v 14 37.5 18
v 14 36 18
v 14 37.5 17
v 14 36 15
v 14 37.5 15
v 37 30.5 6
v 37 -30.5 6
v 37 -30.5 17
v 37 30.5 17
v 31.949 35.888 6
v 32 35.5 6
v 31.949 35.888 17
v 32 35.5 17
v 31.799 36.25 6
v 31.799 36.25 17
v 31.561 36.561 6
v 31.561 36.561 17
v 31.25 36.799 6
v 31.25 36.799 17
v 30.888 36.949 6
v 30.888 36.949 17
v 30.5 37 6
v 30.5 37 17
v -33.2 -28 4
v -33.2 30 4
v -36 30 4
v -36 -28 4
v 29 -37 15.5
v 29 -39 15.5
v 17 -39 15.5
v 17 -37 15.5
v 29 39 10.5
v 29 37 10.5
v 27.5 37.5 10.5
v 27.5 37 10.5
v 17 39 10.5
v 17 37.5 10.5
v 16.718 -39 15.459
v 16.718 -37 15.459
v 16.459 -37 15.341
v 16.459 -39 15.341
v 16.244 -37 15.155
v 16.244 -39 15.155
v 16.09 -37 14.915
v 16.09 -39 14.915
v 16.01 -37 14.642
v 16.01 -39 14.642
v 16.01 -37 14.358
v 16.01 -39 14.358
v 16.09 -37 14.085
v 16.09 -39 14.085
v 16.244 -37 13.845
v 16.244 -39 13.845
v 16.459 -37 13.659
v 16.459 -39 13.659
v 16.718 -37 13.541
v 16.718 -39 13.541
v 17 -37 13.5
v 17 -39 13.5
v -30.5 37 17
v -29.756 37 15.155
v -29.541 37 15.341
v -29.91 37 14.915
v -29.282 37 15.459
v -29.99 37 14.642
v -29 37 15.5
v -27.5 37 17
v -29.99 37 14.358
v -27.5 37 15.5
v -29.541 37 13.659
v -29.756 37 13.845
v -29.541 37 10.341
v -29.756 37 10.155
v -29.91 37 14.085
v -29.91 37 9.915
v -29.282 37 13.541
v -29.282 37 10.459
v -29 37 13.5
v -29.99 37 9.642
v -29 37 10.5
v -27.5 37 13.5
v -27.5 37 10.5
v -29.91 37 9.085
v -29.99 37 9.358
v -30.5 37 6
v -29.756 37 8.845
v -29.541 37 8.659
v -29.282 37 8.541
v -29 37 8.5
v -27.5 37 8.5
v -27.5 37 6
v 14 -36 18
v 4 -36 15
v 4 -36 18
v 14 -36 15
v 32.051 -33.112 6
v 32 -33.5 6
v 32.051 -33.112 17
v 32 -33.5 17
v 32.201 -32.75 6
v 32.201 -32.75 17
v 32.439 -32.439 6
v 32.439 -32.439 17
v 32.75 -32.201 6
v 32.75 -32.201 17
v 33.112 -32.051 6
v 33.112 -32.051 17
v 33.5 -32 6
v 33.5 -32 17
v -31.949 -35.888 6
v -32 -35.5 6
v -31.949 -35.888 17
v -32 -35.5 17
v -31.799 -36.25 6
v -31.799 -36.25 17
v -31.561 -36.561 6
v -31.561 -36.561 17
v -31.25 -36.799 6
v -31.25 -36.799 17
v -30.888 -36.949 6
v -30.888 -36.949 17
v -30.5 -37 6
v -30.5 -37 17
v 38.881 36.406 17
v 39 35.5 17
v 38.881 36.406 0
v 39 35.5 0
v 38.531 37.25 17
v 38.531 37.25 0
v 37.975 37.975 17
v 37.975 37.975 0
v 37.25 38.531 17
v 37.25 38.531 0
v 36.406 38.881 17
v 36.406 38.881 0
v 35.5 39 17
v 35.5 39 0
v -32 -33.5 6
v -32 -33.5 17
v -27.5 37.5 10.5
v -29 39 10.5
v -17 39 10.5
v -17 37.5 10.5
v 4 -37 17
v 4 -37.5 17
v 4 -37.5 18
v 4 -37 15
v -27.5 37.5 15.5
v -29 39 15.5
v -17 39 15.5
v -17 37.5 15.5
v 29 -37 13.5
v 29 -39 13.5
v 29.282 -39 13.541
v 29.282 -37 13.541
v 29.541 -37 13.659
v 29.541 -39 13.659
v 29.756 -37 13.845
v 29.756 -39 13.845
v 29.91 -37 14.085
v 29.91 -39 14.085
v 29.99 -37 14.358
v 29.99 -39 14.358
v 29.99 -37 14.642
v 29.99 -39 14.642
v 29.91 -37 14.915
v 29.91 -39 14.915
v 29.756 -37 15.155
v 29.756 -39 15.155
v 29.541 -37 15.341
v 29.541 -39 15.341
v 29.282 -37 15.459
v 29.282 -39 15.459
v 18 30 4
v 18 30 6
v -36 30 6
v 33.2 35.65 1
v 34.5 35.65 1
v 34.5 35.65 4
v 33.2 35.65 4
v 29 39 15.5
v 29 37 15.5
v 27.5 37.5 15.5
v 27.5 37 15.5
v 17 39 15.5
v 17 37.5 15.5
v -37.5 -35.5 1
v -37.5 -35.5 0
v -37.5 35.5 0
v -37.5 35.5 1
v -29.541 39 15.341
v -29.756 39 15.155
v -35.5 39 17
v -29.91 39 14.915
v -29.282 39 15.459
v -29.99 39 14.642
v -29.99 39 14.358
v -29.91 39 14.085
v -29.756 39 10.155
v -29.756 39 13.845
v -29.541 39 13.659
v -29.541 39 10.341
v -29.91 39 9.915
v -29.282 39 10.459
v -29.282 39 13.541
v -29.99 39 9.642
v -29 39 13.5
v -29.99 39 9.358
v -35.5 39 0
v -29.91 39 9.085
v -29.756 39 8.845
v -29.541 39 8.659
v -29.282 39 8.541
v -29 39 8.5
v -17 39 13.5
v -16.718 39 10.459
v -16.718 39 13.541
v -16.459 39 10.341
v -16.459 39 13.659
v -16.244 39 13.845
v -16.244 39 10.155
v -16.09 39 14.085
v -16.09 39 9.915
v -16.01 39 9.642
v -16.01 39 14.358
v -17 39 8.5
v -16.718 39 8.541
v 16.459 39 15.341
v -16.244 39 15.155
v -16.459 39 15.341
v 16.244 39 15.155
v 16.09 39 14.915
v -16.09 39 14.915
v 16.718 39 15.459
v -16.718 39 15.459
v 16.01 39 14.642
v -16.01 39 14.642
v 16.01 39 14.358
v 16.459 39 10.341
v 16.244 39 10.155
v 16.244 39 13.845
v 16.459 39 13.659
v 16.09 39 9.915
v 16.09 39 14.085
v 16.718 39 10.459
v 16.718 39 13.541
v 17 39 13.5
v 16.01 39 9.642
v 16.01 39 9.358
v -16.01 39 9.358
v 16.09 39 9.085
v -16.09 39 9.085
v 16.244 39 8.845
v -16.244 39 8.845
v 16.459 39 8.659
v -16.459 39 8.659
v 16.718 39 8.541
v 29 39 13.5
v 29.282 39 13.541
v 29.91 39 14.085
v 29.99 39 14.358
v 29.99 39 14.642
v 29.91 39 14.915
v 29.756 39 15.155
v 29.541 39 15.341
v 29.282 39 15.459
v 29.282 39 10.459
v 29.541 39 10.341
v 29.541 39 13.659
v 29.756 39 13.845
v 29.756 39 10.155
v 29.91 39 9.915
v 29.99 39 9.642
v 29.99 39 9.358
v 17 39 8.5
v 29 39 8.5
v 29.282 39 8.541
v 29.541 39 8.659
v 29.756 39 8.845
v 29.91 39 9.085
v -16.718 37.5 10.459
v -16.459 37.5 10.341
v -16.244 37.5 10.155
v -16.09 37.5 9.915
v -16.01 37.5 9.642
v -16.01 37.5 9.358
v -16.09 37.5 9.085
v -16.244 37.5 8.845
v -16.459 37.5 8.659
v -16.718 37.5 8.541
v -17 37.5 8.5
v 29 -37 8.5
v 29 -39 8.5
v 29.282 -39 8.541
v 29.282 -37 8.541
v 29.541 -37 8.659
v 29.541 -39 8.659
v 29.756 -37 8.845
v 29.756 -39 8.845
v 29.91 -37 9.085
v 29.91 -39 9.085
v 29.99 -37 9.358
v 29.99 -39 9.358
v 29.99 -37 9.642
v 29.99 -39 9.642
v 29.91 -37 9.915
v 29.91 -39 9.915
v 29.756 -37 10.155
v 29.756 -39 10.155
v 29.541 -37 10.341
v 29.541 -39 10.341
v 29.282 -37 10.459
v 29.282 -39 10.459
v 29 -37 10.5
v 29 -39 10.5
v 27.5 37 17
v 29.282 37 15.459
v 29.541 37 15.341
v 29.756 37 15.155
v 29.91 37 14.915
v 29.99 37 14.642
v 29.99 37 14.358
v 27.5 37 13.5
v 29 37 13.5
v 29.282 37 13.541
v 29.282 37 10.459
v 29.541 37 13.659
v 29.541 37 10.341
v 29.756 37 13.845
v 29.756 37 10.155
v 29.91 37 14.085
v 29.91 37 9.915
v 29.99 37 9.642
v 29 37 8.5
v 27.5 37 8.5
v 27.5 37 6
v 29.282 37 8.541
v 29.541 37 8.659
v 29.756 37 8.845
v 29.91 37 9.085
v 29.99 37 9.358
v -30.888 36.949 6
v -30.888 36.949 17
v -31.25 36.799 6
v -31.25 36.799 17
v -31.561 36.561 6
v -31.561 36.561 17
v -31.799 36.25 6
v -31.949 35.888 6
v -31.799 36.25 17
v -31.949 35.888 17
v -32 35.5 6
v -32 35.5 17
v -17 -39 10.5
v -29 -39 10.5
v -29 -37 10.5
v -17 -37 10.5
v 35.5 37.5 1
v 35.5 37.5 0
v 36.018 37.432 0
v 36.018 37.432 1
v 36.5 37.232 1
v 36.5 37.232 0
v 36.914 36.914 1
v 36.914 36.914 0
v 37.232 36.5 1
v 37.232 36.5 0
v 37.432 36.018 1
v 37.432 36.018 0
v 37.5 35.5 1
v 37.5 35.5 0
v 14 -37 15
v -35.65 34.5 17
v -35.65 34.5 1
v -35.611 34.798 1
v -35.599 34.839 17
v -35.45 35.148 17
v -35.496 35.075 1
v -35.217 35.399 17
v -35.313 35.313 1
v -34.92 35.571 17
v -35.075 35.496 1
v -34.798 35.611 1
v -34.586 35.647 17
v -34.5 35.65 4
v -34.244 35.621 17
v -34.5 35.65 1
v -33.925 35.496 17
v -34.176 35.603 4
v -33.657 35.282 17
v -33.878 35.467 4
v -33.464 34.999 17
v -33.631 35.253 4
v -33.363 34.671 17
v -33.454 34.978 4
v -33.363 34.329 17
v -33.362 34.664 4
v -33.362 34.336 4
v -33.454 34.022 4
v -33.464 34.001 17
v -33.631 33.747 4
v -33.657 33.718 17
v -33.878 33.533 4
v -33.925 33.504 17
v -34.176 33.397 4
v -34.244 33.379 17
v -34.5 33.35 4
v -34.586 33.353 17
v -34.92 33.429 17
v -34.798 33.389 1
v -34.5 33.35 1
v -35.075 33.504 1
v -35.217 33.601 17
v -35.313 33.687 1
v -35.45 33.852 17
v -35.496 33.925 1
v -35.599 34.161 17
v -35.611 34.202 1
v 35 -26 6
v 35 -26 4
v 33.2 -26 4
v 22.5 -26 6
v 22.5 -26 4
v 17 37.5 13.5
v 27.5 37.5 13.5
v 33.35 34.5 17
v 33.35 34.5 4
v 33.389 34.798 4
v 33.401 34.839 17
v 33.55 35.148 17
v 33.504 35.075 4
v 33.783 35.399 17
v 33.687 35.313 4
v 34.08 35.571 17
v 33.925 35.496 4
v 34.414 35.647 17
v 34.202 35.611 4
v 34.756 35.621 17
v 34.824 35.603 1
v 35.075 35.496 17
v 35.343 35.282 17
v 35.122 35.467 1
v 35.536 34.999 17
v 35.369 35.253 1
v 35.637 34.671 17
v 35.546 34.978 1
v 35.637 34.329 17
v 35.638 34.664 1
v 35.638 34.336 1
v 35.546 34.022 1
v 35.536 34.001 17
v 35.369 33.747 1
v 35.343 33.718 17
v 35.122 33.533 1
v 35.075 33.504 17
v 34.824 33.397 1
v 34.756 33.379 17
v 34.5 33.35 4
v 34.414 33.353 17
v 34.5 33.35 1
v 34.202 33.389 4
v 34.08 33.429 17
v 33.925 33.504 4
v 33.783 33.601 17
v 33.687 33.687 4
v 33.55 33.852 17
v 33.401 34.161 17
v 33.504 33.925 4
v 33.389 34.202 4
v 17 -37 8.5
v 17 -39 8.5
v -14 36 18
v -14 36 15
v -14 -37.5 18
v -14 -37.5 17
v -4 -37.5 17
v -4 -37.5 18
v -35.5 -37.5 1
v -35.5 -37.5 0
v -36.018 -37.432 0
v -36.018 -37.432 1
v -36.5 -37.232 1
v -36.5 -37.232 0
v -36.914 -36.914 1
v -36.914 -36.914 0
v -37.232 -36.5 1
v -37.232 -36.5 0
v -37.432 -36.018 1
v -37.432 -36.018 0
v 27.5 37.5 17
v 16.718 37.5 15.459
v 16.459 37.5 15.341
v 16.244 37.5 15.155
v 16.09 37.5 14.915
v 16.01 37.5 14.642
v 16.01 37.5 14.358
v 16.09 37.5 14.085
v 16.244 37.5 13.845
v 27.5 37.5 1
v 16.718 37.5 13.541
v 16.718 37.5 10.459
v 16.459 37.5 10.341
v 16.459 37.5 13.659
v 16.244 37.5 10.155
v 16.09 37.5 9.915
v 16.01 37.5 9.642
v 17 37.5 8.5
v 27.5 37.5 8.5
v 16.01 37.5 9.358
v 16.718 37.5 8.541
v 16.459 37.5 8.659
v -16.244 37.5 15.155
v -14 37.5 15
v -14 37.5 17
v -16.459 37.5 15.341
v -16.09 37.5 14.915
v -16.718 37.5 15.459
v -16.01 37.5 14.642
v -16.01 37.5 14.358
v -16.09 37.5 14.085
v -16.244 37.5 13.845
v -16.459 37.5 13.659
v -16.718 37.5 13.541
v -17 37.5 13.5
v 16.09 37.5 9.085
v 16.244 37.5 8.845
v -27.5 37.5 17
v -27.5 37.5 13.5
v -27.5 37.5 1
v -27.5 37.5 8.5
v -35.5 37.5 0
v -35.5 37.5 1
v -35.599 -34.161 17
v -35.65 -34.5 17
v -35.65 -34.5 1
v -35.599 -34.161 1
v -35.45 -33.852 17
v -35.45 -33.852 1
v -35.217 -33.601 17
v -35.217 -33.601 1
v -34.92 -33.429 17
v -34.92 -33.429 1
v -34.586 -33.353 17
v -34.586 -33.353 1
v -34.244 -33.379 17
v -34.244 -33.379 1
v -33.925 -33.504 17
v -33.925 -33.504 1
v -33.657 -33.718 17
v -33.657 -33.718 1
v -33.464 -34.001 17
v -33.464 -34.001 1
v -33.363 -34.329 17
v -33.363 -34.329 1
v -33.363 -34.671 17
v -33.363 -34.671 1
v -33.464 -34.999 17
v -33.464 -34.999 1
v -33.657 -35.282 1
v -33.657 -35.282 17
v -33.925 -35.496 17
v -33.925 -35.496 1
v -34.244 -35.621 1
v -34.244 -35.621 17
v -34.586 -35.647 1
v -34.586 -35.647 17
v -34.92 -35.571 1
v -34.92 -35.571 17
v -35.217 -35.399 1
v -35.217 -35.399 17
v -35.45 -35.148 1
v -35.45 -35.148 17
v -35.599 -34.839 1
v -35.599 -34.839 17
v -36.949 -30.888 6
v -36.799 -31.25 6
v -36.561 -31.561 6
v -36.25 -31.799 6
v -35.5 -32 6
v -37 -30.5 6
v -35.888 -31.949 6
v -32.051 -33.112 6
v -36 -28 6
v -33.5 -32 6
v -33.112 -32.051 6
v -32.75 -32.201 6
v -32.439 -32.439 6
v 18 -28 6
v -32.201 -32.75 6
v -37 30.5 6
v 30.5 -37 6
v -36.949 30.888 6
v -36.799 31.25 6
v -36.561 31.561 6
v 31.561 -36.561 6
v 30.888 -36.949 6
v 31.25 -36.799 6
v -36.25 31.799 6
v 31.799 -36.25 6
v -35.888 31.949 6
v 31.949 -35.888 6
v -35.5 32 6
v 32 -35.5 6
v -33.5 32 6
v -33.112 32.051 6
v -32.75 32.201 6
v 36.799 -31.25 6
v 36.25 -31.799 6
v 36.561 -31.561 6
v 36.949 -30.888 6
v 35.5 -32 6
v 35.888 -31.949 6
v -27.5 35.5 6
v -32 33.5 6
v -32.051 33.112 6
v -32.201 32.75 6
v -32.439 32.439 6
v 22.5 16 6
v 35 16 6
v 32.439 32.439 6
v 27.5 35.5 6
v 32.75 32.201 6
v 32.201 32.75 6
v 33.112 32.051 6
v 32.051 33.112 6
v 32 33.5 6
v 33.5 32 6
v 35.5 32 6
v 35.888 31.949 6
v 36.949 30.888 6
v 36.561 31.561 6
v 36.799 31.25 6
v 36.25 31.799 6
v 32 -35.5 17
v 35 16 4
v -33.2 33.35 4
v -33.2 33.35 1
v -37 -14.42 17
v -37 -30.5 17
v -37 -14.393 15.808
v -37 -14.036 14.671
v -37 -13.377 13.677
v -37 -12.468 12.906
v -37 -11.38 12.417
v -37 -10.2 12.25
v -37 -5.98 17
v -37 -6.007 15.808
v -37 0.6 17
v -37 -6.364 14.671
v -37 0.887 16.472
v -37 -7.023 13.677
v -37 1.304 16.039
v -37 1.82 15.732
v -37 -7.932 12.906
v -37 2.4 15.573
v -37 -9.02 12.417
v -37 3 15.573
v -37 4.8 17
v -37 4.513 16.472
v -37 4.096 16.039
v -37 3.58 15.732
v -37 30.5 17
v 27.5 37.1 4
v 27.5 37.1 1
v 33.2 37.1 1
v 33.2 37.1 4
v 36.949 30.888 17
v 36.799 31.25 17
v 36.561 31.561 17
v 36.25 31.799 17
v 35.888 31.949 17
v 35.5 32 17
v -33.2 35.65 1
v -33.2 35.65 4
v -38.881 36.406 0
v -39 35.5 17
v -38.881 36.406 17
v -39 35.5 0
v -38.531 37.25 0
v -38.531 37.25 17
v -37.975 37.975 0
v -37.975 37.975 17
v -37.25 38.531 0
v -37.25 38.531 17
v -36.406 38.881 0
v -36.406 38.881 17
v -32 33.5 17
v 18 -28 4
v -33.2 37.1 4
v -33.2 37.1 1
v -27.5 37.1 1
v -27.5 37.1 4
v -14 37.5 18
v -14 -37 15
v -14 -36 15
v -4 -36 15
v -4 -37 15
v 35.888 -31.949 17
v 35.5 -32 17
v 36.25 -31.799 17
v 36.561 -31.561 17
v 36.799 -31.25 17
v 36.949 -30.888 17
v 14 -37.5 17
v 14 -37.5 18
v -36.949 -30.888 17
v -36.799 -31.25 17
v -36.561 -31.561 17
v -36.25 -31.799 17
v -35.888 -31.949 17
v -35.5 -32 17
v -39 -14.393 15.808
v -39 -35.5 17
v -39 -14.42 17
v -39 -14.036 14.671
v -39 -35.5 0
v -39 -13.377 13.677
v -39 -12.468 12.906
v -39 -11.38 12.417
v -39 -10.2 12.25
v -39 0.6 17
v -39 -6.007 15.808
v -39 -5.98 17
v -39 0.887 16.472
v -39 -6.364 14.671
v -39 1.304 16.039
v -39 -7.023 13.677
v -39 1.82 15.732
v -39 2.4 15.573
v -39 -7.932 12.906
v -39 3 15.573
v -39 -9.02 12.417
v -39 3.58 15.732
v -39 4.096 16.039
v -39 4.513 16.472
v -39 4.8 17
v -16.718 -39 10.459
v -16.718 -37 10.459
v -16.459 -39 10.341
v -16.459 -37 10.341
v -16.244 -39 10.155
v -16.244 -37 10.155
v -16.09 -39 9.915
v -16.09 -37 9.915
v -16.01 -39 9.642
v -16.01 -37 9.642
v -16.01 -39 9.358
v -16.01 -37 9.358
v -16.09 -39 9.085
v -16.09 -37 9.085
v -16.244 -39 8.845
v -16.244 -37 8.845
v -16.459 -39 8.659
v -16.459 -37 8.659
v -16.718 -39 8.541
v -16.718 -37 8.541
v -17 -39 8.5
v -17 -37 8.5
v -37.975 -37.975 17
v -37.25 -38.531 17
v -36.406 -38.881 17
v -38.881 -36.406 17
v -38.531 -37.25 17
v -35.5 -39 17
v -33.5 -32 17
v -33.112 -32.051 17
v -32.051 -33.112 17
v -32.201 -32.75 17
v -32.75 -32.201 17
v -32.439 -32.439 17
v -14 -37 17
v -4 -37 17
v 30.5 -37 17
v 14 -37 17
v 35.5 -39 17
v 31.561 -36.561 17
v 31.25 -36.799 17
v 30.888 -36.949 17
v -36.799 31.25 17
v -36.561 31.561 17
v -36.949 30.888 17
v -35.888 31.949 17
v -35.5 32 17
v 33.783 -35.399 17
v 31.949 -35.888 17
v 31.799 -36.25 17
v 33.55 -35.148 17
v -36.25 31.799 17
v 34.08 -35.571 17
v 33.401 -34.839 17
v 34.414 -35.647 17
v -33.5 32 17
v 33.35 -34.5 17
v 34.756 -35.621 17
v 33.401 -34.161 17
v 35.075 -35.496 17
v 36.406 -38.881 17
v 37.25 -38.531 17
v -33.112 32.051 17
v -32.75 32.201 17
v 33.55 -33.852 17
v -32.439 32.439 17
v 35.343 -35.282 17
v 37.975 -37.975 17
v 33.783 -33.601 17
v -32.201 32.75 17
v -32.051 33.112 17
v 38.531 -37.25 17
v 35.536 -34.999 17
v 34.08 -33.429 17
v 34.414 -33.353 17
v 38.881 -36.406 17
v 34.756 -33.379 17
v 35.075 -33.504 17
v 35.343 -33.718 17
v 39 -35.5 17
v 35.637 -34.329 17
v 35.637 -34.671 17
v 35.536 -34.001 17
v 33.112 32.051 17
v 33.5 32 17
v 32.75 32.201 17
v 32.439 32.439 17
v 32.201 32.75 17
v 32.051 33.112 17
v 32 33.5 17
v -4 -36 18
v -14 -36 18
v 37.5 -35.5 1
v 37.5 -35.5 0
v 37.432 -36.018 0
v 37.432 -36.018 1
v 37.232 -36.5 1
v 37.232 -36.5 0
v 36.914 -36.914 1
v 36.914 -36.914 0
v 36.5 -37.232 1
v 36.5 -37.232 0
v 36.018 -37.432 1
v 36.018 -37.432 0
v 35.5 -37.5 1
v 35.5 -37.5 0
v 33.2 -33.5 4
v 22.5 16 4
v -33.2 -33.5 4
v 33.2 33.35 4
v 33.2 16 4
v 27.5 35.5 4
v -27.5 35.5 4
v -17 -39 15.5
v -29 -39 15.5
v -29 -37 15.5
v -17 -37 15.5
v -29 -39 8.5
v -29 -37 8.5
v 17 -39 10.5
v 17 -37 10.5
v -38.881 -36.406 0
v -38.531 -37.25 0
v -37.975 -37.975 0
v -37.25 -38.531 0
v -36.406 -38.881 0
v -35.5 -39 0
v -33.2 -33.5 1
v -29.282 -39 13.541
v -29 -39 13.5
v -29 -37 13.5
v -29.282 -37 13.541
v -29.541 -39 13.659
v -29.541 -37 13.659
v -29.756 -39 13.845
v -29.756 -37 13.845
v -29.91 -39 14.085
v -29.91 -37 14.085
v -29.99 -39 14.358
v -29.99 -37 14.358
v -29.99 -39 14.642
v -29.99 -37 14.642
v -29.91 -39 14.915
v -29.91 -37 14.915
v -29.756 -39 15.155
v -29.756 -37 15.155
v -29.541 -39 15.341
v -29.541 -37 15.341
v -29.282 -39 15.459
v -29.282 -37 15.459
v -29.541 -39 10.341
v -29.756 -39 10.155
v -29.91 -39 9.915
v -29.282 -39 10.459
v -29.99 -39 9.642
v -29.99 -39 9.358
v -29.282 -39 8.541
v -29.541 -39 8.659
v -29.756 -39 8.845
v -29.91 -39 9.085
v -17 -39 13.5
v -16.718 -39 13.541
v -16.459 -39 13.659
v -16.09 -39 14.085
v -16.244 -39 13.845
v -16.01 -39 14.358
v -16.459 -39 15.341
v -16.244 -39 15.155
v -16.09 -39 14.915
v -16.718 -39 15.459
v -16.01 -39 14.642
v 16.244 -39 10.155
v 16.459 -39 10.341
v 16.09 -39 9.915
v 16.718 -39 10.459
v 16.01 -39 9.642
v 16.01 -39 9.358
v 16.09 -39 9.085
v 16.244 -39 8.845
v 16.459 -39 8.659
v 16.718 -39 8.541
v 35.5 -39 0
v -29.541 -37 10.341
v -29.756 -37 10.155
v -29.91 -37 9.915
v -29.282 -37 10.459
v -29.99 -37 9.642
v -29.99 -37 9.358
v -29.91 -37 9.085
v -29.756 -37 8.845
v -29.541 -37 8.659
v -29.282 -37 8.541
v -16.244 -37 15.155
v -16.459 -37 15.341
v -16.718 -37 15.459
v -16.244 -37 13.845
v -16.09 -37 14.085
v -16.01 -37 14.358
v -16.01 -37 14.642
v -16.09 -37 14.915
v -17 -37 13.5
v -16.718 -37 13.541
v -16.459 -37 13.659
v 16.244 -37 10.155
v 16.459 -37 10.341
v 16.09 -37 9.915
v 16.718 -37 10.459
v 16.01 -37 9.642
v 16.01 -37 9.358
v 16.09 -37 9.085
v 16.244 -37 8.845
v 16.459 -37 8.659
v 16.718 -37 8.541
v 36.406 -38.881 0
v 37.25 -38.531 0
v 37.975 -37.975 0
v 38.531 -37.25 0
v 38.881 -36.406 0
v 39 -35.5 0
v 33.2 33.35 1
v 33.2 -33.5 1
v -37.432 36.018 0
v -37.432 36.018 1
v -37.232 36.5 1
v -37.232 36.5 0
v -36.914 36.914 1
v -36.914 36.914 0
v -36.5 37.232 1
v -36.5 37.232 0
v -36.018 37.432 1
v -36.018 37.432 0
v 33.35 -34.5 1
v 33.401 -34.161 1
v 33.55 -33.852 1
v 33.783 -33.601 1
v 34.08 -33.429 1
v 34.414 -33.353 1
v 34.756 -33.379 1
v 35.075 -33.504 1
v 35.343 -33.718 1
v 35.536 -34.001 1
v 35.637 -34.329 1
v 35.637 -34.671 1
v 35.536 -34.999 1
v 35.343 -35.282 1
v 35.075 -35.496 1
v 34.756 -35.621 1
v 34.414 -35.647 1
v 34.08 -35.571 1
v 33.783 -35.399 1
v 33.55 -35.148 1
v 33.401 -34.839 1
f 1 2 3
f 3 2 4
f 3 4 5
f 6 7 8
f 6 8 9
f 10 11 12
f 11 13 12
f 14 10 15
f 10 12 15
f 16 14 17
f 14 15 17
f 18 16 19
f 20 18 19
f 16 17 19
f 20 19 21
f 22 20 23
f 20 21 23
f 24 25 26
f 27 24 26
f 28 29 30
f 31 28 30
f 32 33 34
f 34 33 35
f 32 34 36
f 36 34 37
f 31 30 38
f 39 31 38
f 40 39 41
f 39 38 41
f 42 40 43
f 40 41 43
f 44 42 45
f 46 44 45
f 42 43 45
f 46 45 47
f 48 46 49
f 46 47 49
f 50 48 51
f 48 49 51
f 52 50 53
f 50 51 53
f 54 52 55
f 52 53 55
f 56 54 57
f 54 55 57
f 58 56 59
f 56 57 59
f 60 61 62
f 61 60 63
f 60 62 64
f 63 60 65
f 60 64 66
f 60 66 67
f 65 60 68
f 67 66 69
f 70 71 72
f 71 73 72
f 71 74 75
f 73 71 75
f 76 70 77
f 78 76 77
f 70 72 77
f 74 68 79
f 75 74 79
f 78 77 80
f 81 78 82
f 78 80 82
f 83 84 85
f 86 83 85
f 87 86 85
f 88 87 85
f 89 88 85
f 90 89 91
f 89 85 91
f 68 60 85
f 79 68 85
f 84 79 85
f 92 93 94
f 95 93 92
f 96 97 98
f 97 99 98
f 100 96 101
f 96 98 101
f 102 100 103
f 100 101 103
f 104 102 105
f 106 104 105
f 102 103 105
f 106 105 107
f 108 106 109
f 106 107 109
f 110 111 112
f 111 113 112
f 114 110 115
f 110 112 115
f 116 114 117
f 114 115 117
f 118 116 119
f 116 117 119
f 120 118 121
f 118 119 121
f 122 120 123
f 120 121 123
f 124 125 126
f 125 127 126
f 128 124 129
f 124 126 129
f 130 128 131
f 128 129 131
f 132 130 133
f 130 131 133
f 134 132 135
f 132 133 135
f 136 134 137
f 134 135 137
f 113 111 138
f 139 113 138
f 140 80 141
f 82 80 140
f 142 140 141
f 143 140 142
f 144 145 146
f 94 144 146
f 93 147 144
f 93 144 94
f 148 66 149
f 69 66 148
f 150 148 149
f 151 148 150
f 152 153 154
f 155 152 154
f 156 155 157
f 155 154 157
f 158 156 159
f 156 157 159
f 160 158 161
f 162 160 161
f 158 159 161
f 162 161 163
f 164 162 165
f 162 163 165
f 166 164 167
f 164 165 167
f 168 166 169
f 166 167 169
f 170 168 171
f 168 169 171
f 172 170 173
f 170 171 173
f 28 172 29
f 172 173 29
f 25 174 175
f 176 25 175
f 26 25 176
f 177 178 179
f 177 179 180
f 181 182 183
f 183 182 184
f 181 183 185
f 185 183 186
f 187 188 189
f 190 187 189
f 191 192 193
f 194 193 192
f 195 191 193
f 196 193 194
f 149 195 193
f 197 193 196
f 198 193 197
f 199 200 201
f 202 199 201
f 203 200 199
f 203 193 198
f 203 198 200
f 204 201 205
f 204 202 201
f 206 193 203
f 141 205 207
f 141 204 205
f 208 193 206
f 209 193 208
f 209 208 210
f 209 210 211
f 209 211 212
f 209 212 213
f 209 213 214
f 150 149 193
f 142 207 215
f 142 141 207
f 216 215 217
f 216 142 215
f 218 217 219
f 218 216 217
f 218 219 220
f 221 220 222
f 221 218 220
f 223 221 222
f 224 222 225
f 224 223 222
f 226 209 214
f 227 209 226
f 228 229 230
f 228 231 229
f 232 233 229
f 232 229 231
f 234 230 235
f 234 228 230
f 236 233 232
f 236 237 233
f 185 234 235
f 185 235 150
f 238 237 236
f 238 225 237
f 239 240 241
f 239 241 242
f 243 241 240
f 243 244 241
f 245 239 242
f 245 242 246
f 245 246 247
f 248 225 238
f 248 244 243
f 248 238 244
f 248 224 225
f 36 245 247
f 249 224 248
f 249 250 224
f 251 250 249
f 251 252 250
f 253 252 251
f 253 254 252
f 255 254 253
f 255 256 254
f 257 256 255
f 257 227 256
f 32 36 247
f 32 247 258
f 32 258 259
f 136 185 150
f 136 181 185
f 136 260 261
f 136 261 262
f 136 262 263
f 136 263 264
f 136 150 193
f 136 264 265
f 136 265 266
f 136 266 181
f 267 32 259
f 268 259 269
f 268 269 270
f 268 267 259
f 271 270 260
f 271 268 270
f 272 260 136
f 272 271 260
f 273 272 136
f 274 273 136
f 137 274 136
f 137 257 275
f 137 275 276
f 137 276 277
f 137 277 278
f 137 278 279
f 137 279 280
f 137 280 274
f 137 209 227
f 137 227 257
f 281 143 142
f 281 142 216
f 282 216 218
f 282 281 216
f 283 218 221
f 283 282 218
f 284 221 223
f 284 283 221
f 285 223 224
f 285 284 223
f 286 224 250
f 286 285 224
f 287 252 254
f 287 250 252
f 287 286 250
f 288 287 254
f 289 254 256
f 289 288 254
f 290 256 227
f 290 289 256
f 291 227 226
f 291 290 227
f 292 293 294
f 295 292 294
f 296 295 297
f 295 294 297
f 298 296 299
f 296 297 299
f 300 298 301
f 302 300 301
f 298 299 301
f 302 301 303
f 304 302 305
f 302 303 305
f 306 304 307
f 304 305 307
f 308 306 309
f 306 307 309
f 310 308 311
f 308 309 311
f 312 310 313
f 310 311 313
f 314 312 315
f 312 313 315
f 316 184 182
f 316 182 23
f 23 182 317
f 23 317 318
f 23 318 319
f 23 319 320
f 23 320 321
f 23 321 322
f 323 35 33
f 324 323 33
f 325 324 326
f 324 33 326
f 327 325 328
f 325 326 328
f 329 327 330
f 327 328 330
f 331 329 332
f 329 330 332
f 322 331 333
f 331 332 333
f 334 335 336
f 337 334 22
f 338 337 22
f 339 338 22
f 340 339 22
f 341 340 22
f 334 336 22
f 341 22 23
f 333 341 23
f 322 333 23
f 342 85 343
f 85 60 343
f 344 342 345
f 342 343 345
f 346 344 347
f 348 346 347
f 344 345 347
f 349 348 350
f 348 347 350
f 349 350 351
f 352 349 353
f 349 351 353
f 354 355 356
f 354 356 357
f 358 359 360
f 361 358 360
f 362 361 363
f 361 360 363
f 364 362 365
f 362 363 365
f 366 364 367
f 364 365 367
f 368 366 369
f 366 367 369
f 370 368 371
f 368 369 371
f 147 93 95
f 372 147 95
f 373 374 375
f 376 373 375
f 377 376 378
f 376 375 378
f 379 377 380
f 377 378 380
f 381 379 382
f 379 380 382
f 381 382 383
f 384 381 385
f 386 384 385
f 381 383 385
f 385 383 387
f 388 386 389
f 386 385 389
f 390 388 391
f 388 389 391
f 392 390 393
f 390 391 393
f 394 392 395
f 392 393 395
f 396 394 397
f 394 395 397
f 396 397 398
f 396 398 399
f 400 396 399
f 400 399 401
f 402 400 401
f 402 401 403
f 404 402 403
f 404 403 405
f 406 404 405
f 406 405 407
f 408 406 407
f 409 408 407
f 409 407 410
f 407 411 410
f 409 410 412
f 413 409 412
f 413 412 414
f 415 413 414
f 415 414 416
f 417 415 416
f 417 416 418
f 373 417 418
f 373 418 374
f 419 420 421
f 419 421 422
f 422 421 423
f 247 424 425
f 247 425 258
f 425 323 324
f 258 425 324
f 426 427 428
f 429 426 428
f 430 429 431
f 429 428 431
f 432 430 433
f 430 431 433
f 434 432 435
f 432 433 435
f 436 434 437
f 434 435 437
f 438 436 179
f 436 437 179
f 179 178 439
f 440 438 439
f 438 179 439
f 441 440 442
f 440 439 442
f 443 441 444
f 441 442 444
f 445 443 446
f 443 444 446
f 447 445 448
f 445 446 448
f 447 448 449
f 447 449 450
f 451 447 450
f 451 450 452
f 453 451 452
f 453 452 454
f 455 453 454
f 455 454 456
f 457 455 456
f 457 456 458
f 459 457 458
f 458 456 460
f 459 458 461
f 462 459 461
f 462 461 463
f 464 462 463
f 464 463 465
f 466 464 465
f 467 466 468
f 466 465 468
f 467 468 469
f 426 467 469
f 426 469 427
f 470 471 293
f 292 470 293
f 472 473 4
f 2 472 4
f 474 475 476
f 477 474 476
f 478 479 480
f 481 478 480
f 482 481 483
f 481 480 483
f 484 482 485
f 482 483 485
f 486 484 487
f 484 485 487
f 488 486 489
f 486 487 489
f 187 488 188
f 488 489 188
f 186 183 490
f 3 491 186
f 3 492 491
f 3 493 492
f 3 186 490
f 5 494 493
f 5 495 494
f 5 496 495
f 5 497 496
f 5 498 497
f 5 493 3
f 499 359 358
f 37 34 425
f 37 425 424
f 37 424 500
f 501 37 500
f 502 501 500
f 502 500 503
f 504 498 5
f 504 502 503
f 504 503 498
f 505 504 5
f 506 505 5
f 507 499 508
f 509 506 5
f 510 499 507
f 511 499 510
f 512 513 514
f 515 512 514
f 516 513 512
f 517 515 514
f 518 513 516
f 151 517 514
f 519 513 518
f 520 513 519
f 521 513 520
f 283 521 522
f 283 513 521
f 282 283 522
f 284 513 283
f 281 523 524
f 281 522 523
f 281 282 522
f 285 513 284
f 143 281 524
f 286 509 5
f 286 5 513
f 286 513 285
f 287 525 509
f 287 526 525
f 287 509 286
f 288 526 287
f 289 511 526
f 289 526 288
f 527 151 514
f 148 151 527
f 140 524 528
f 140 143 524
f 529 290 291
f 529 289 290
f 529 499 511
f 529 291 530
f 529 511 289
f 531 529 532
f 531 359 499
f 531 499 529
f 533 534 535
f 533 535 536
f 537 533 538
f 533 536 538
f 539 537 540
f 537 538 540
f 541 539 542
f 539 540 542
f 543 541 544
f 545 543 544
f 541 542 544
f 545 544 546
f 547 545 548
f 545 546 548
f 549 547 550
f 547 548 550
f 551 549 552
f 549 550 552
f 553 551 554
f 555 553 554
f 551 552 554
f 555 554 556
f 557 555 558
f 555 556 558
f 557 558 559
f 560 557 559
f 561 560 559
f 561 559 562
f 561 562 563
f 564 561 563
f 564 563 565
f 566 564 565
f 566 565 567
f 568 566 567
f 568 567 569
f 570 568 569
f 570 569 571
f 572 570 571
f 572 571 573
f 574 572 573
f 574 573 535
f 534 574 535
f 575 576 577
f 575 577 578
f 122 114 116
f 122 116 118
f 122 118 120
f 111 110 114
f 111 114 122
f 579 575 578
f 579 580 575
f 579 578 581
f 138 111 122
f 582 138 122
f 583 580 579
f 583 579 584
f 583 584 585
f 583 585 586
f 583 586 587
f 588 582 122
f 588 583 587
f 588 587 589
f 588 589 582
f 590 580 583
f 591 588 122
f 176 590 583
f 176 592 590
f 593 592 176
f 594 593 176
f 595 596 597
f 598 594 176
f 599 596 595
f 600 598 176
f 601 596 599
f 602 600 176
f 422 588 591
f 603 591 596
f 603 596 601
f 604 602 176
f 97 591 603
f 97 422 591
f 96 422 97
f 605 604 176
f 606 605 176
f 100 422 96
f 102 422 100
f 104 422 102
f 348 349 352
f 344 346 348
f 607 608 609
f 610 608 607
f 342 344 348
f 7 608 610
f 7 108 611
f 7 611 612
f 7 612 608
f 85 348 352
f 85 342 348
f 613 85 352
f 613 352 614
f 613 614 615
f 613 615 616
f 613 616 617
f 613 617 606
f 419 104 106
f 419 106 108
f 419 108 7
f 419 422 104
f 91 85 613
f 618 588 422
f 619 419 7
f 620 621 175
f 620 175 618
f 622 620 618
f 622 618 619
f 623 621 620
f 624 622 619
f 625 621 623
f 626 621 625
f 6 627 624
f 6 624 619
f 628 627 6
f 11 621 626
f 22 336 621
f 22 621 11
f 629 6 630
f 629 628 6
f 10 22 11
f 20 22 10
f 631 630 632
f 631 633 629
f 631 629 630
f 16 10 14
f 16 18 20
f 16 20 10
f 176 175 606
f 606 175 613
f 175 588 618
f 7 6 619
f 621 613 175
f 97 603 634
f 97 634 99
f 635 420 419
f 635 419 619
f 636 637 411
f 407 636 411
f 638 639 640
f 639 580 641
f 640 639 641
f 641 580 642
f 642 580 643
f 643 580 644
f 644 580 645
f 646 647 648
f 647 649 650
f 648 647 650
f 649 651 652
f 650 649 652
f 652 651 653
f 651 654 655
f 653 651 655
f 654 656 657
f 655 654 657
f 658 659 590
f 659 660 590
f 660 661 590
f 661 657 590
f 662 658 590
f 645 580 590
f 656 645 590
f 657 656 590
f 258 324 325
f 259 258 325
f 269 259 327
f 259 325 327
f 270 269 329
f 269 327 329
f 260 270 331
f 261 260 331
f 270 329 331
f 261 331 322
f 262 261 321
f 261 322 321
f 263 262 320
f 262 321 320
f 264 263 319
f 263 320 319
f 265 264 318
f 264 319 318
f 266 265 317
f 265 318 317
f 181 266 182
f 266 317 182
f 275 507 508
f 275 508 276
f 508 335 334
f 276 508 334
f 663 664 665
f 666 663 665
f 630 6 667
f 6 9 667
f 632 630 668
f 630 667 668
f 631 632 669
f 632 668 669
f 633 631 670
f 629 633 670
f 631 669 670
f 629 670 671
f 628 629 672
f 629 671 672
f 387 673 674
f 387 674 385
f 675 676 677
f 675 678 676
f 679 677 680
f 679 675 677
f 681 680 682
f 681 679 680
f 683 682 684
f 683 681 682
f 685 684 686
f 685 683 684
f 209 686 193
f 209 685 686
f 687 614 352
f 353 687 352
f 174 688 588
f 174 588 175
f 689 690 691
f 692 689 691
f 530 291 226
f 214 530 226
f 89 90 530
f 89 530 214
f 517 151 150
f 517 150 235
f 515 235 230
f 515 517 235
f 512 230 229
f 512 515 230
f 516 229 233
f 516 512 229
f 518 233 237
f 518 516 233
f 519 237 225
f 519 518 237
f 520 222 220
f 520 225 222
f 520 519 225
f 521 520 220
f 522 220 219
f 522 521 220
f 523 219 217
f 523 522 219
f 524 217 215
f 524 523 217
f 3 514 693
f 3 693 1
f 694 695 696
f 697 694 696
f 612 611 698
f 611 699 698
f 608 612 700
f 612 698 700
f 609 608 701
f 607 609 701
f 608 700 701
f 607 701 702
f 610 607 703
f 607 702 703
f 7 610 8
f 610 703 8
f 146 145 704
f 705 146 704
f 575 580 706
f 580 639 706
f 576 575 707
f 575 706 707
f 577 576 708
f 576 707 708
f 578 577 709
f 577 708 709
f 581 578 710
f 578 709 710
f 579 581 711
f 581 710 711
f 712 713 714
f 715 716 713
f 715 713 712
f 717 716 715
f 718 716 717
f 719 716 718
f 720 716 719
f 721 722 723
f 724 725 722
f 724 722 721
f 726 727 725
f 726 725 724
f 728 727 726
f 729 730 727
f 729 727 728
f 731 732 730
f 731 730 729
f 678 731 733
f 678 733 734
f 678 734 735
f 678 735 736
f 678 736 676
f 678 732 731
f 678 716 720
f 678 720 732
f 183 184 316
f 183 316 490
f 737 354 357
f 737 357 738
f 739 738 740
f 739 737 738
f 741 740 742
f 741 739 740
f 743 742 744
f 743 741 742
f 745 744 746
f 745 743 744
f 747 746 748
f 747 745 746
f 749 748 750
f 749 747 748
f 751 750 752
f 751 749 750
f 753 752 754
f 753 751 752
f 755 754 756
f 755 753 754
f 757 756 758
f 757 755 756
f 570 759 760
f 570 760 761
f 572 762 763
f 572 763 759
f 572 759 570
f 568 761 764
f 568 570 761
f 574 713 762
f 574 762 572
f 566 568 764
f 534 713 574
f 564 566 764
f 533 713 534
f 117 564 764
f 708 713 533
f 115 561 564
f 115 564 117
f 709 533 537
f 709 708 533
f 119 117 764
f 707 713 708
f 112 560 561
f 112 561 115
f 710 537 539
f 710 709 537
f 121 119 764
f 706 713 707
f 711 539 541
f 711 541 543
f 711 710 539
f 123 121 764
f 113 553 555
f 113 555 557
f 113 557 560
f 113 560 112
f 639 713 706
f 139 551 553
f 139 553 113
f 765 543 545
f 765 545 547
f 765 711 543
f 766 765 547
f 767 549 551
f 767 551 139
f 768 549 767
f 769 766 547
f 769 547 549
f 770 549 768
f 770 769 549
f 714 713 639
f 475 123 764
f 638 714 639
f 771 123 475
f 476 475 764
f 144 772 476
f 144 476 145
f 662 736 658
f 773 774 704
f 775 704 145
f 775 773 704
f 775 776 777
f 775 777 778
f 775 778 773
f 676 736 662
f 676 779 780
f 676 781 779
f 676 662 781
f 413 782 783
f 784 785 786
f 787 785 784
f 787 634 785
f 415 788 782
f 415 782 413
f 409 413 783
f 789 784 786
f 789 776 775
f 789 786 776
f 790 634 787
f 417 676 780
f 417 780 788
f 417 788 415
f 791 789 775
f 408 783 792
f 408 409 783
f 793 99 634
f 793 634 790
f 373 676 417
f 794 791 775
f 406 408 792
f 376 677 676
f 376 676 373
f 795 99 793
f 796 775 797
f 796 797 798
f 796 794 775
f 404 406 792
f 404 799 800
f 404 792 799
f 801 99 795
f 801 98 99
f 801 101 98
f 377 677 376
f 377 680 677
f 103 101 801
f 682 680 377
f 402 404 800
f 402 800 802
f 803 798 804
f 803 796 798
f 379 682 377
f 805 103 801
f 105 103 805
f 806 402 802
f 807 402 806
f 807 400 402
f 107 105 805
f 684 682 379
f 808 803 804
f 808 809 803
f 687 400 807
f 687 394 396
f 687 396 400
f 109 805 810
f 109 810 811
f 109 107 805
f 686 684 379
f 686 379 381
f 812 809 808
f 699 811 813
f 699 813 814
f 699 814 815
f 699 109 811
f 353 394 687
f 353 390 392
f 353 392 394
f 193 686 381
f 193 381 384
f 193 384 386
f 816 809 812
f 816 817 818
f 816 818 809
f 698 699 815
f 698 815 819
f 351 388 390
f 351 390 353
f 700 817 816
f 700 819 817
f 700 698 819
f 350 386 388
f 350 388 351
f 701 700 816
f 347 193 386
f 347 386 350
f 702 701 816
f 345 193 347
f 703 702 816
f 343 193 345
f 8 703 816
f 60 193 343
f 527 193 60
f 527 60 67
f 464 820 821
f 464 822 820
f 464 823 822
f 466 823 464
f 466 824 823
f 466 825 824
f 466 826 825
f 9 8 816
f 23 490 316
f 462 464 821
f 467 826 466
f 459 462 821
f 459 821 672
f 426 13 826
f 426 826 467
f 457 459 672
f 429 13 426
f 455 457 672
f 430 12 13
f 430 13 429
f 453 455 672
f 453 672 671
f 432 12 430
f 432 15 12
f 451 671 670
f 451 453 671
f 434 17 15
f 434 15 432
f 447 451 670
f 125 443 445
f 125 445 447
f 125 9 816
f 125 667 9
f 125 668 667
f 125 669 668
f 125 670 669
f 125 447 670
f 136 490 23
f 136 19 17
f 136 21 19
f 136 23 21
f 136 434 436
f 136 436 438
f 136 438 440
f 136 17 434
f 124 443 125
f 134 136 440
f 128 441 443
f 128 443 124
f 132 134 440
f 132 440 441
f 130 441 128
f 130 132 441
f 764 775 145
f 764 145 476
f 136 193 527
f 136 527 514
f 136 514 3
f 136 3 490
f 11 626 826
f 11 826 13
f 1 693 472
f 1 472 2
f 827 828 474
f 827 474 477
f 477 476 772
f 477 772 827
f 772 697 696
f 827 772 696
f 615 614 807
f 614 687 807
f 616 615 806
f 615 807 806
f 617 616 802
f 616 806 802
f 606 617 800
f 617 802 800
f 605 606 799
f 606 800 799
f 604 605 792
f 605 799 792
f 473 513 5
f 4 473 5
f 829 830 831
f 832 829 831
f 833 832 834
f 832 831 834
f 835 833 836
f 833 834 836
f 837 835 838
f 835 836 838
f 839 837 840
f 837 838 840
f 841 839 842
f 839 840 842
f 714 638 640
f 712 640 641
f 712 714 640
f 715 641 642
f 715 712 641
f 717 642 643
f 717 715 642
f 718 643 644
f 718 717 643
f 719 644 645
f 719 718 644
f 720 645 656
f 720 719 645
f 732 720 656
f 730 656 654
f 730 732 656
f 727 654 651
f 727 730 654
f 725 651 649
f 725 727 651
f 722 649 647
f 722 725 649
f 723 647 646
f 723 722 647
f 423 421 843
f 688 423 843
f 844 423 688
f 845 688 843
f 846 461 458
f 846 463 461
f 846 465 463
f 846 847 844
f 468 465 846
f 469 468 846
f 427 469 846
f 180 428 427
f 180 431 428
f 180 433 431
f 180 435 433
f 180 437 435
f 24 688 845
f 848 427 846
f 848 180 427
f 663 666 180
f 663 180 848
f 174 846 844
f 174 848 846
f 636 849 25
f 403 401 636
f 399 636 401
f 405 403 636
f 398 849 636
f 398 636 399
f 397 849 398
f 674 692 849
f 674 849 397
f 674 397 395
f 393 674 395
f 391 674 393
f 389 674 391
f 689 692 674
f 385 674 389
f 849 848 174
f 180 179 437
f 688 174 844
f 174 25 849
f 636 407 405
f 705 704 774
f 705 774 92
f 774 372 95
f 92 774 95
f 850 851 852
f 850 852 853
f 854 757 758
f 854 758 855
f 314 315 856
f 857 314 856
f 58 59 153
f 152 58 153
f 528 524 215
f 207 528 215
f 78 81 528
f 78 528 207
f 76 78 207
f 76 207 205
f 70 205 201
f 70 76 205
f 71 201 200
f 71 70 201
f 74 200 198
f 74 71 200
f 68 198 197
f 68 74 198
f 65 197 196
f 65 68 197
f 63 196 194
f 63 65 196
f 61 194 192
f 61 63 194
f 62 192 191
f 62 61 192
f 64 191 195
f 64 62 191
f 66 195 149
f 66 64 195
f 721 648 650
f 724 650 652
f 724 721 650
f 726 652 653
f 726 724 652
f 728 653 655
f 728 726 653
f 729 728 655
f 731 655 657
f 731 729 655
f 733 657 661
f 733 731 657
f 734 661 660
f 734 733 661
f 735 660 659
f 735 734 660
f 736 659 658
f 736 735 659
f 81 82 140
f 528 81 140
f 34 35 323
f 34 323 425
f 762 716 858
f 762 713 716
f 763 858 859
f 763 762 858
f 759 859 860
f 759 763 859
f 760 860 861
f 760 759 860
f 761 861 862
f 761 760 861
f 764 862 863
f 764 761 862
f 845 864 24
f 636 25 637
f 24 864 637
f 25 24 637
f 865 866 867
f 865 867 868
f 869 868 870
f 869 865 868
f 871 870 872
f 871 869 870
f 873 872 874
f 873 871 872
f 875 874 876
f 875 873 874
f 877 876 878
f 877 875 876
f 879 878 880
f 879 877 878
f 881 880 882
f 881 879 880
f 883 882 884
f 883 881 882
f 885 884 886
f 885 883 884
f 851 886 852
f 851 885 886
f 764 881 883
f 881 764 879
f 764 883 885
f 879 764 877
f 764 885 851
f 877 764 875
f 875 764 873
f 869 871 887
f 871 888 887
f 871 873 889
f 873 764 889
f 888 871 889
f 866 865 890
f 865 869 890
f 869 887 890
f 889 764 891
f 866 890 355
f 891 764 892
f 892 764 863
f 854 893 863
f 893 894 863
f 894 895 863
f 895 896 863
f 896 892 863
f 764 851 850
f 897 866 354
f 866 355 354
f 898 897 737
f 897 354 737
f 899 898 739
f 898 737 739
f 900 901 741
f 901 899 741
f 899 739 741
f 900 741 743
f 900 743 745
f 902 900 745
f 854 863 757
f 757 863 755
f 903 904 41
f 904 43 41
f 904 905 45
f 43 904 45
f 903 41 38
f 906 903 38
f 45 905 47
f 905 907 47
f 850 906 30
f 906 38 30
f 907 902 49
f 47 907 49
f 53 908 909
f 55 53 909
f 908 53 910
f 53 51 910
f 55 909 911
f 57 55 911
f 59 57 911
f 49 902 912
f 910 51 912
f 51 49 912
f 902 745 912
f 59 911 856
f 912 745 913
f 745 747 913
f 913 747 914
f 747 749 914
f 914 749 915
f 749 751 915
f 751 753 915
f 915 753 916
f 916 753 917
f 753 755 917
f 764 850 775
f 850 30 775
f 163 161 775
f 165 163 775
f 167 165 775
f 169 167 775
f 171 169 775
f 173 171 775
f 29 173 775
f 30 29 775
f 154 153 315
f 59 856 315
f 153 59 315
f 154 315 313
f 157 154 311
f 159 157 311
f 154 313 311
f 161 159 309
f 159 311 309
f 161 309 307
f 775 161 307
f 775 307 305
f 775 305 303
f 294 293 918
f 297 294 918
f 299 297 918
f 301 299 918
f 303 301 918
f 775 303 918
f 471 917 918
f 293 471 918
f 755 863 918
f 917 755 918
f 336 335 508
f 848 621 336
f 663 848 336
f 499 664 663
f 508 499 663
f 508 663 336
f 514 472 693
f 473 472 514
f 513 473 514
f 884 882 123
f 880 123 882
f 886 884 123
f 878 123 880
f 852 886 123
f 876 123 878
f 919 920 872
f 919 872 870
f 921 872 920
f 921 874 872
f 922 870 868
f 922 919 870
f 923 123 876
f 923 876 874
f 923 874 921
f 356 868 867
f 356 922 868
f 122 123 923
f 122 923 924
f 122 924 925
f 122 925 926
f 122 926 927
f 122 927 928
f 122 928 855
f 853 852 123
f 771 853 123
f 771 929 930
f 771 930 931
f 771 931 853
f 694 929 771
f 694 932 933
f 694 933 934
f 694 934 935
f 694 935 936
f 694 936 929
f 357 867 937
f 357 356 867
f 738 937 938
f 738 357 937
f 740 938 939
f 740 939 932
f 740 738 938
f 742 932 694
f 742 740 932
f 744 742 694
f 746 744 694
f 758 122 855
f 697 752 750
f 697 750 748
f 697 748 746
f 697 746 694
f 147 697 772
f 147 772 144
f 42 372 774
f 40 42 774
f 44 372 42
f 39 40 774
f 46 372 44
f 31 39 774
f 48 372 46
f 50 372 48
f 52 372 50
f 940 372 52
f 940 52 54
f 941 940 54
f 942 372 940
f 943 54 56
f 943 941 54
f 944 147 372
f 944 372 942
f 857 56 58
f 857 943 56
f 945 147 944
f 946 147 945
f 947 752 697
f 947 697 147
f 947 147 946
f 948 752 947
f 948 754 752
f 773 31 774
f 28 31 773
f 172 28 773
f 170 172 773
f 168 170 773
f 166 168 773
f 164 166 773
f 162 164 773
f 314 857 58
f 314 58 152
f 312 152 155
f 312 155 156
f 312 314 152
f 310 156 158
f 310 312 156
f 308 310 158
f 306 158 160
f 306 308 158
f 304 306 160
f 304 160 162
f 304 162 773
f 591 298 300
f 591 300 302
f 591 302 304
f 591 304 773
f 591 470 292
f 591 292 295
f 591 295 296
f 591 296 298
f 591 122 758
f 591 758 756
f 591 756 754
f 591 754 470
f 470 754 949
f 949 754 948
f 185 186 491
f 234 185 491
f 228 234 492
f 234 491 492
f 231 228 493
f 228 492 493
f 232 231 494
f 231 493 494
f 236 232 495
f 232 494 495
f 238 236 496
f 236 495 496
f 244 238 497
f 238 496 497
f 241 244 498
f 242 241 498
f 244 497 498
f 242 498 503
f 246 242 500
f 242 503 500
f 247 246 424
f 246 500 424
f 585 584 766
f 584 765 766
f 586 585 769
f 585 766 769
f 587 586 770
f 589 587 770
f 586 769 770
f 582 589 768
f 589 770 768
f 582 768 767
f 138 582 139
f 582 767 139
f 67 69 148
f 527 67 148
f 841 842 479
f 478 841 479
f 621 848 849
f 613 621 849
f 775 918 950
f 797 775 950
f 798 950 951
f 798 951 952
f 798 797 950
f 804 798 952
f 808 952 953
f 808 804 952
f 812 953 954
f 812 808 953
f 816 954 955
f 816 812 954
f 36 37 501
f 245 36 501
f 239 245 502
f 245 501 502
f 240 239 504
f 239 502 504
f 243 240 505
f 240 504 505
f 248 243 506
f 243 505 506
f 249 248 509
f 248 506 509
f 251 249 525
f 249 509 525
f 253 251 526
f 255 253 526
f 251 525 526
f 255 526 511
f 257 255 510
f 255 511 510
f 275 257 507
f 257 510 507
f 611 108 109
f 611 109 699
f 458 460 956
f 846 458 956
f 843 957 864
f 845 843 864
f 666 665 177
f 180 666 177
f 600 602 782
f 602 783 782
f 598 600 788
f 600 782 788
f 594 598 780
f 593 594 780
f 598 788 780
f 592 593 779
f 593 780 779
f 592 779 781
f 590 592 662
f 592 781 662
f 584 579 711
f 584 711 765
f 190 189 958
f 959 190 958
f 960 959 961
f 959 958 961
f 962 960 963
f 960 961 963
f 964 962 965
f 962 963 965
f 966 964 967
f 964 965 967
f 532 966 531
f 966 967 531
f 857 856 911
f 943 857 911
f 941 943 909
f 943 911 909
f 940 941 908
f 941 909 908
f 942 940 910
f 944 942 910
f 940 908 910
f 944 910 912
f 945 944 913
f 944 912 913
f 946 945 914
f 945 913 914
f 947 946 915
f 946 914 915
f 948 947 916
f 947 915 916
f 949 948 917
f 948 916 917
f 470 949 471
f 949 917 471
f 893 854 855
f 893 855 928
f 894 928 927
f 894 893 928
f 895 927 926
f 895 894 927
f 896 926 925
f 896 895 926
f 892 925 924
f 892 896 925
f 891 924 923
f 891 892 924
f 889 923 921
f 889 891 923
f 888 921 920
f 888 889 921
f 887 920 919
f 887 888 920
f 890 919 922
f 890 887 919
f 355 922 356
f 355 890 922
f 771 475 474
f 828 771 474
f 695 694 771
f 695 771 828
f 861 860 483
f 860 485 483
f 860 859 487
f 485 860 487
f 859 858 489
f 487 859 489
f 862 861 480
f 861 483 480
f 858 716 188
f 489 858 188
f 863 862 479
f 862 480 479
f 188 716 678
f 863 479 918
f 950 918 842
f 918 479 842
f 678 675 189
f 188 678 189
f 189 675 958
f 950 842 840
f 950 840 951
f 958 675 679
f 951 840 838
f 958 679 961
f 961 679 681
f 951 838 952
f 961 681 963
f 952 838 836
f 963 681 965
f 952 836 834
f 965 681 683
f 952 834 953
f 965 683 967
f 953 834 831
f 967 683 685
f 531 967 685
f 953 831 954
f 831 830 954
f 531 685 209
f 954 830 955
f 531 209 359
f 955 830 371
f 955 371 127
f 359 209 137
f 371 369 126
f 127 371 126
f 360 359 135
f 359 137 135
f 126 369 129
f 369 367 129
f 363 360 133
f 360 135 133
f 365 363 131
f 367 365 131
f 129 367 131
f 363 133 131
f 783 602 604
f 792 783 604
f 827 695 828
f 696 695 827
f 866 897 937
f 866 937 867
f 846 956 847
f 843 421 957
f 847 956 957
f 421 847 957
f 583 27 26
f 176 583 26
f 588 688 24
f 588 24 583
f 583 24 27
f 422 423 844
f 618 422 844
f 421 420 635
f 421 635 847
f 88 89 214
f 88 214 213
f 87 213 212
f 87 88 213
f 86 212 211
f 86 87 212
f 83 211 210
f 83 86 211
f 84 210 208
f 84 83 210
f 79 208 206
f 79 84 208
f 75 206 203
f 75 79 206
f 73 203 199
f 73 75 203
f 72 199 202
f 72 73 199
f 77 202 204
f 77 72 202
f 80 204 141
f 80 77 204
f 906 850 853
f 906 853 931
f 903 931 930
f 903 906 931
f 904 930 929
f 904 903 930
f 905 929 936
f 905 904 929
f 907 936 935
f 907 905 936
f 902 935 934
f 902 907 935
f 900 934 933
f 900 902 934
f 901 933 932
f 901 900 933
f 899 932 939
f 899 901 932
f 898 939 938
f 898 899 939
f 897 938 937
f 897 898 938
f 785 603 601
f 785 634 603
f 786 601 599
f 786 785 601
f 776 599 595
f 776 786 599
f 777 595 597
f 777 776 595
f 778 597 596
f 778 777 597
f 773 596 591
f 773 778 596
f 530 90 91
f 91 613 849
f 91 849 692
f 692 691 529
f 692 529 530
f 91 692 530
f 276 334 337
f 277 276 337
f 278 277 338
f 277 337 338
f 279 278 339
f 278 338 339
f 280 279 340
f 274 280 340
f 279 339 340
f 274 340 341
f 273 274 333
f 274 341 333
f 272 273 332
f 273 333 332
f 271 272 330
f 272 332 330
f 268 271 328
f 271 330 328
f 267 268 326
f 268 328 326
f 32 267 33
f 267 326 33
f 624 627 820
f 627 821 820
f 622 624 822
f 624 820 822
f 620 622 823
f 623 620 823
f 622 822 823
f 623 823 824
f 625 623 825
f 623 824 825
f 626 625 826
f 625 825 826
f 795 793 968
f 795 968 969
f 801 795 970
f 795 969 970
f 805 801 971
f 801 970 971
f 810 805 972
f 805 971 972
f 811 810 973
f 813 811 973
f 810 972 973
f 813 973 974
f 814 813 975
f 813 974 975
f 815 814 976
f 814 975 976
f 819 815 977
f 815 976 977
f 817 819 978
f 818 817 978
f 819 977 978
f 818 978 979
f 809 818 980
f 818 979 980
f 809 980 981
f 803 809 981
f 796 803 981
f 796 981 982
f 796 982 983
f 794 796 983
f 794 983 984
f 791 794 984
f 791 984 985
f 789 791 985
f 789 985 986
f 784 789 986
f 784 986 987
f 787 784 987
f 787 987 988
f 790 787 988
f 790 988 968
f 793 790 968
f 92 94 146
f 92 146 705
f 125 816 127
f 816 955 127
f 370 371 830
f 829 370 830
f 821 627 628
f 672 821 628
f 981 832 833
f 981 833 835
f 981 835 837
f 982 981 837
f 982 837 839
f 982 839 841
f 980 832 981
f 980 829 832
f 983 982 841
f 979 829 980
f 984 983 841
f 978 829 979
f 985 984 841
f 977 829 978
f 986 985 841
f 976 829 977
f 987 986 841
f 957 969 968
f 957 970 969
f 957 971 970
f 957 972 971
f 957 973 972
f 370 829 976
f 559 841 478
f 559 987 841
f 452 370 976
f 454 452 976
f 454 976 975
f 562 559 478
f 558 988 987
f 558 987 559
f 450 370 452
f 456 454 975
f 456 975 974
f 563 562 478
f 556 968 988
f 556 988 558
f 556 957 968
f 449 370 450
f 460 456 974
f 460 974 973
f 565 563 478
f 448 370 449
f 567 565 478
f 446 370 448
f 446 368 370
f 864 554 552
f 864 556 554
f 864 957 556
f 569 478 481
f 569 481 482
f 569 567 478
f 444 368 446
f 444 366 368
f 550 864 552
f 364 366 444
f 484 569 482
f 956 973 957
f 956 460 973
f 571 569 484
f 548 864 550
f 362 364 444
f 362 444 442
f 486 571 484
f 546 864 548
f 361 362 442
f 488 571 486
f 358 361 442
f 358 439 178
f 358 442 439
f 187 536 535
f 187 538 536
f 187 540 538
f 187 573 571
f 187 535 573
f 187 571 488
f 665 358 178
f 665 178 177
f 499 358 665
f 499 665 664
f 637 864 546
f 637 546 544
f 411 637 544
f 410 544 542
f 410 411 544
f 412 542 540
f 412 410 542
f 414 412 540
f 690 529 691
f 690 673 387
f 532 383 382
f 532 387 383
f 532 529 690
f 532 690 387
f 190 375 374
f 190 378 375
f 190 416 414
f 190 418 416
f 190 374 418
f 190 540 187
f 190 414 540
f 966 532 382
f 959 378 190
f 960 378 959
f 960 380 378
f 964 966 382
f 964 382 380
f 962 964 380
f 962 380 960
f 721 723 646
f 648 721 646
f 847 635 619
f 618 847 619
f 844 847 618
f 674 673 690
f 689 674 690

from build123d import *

# Parameters (mm, degrees)
SKETCH_1_W           = 78
SKETCH_1_H           = 78
EXTRUDE_1_DEPTH      = 6
SKETCH_2_W           = 78
SKETCH_2_H           = 78
SKETCH_2_W_2         = 74
SKETCH_2_H_2         = 74
SKETCH_2_W_3         = 5
SKETCH_2_H_3         = 5
EXTRUDE_2_DEPTH      = 11
FILLET_1_R           = 1.5
FILLET_2_R           = 3.5
CUT_EXTRUDE_1_DEPTH  = 1
CUT_EXTRUDE_2_DEPTH  = 3
SKETCH_5_R           = 1.15
CUT_EXTRUDE_3_DEPTH  = 58.428216061
SKETCH_6_W           = 55
SKETCH_6_H           = 2
SKETCH_6_W_2         = 54
SKETCH_6_H_2         = 58
SKETCH_6_W_3         = 12.5
SKETCH_6_H_3         = 42
CUT_EXTRUDE_4_DEPTH  = 57.665686266
EXTRUDE_3_DEPTH      = 1
EXTRUDE_3_DEPTH_BACK = 2
SKETCH_7_W           = 10
SKETCH_7_H           = 1.5
SKETCH_7_W_2         = 28
SKETCH_8_R           = 4.25
SKETCH_8_R_2         = 2.247220505
CUT_EXTRUDE_5_DEPTH  = 10
CUT_EXTRUDE_6_DEPTH  = 90.044932478
SKETCH_10_W          = 1.3
SKETCH_10_H          = 2.3
CUT_EXTRUDE_7_DEPTH  = 3


with BuildPart() as part:
    # 草图1 → 凸台-拉伸1 (new body)
    with BuildSketch(Plane.XY):
        Rectangle(SKETCH_1_W, SKETCH_1_H)
    extrude(amount=EXTRUDE_1_DEPTH)

    # 草图2 → 凸台-拉伸2 (add)
    # profile 1 of 5: a face of its own
    with BuildSketch(Plane.XY.offset(6)):
        Rectangle(SKETCH_2_W, SKETCH_2_H)
        Rectangle(SKETCH_2_W_2, SKETCH_2_H_2, mode=Mode.SUBTRACT)
    # profile 2 of 5: a face of its own
    with BuildSketch(Plane.XY.offset(6)):
        with Locations((-34.5, 34.5)):
            Rectangle(SKETCH_2_W_3, SKETCH_2_H_3)
    # profile 3 of 5: a face of its own
    with BuildSketch(Plane.XY.offset(6)):
        with Locations((34.5, 34.5)):
            Rectangle(SKETCH_2_W_3, SKETCH_2_H_3)
    # profile 4 of 5: a face of its own
    with BuildSketch(Plane.XY.offset(6)):
        with Locations((34.5, -34.5)):
            Rectangle(SKETCH_2_W_3, SKETCH_2_H_3)
    # profile 5 of 5: a face of its own
    with BuildSketch(Plane.XY.offset(6)):
        with Locations((-34.5, -34.5)):
            Rectangle(SKETCH_2_W_3, SKETCH_2_H_3)
    extrude(amount=EXTRUDE_2_DEPTH)

    # 圆角1
    fillet_1_edges = [part.edges().sort_by_distance(p)[0] for p in [
        (-37, -32, 11.5),
        (-37, 32, 11.5),
        (-32, 32, 11.5),
        (-32, 37, 11.5),
        (32, 37, 11.5),
        (32, 32, 11.5),
        (37, 32, 11.5),
        (37, -32, 11.5),
        (32, -32, 11.5),
        (32, -37, 11.5),
        (-32, -37, 11.5),
        (-32, -32, 11.5),
    ]]
    fillet(fillet_1_edges, radius=FILLET_1_R)

    # 圆角2
    fillet_2_edges = [part.edges().sort_by_distance(p)[0] for p in [
        (39, -39, 8.5),
        (-39, -39, 8.5),
        (-39, 39, 8.5),
        (39, 39, 8.5),
    ]]
    fillet(fillet_2_edges, radius=FILLET_2_R)

    # 草图3 → 切除-拉伸1 (cut)
    with BuildSketch(Plane(origin=(0, 0, 0), x_dir=(-1, 0, 0), z_dir=(0, 0, -1))):
        with BuildLine():
            Line((37.5, -35.5), (37.5, 35.5))
            ThreePointArc((37.5, 35.5), (36.914213562, 36.914213562), (35.5, 37.5))
            Line((35.5, 37.5), (-35.5, 37.5))
            ThreePointArc((-35.5, 37.5), (-36.914213562, 36.914213562), (-37.5, 35.5))
            Line((-37.5, 35.5), (-37.5, -35.5))
            ThreePointArc((-37.5, -35.5), (-36.914213562, -36.914213562), (-35.5, -37.5))
            Line((-35.5, -37.5), (35.5, -37.5))
            ThreePointArc((35.5, -37.5), (36.914213562, -36.914213562), (37.5, -35.5))
        make_face()
    extrude(amount=-CUT_EXTRUDE_1_DEPTH, mode=Mode.SUBTRACT)

    # 草图4 → 切除-拉伸2 (cut)
    with BuildSketch(Plane(origin=(0, 0, 1), x_dir=(-1, 0, 0), z_dir=(0, 0, -1))):
        Polygon((27.5, 37.5), (-27.5, 37.5), (-27.5, 37.1), (-33.2, 37.1), (-33.2, -33.5), (33.2, -33.5), (33.2, 37.1), (27.5, 37.1), align=None)
    extrude(amount=-CUT_EXTRUDE_2_DEPTH, mode=Mode.SUBTRACT)

    # 草图5 → 切除-拉伸3 (cut, through all)
    with BuildSketch(Plane(origin=(0, 0, 1), x_dir=(-1, 0, 0), z_dir=(0, 0, -1))):
        with Locations((-34.5, 34.5)):
            Circle(SKETCH_5_R)
        with Locations((34.5, 34.5)):
            Circle(SKETCH_5_R)
        with Locations((34.5, -34.5)):
            Circle(SKETCH_5_R)
        with Locations((-34.5, -34.5)):
            Circle(SKETCH_5_R)
    extrude(amount=-CUT_EXTRUDE_3_DEPTH, mode=Mode.SUBTRACT)

    # 草图6 → 切除-拉伸4 (cut, through all)
    with BuildSketch(Plane(origin=(0, 0, 4), x_dir=(-1, 0, 0), z_dir=(0, 0, -1))):
        with Locations((0, 36.5)):
            Rectangle(SKETCH_6_W, SKETCH_6_H)
        with Locations((9, 1)):
            Rectangle(SKETCH_6_W_2, SKETCH_6_H_2)
        with Locations((-28.75, -5)):
            Rectangle(SKETCH_6_W_3, SKETCH_6_H_3)
    extrude(amount=-CUT_EXTRUDE_4_DEPTH, mode=Mode.SUBTRACT)

    # 草图7 → 凸台-拉伸3 (add, two sides: drawn at the far end of the back side and taken through both)
    with BuildSketch(Plane.XY.offset(17).offset(-EXTRUDE_3_DEPTH_BACK)):
        with Locations((9, -36.75)):
            Rectangle(SKETCH_7_W, SKETCH_7_H)
        with Locations((-9, -36.75)):
            Rectangle(SKETCH_7_W, SKETCH_7_H)
        with Locations((0, 36.75)):
            Rectangle(SKETCH_7_W_2, SKETCH_7_H)
    extrude(amount=EXTRUDE_3_DEPTH + EXTRUDE_3_DEPTH_BACK)

    # 草图8 → 切除-拉伸5 (cut)
    with BuildSketch(Plane(origin=(-39, 0, 0), x_dir=(0, 0, -1), z_dir=(1, 0, 0))):
        with Locations((-16.5, -10.2)):
            Circle(SKETCH_8_R)
        with Locations((-17.8, 2.7)):
            Circle(SKETCH_8_R_2)
    extrude(amount=CUT_EXTRUDE_5_DEPTH, mode=Mode.SUBTRACT)

    # 草图9 → 切除-拉伸6 (cut, through all)
    with BuildSketch(Plane.XZ.offset(39)):
        with BuildLine():
            Line((-29, 15.5), (-17, 15.5))
            ThreePointArc((-17, 15.5), (-16, 14.5), (-17, 13.5))
            Line((-17, 13.5), (-29, 13.5))
            ThreePointArc((-29, 13.5), (-30, 14.5), (-29, 15.5))
        make_face()
        with BuildLine():
            Line((-29, 10.5), (-17, 10.5))
            ThreePointArc((-17, 10.5), (-16, 9.5), (-17, 8.5))
            Line((-17, 8.5), (-29, 8.5))
            ThreePointArc((-29, 8.5), (-30, 9.5), (-29, 10.5))
        make_face()
        with BuildLine():
            Line((29, 10.5), (17, 10.5))
            ThreePointArc((17, 10.5), (16, 9.5), (17, 8.5))
            Line((17, 8.5), (29, 8.5))
            ThreePointArc((29, 8.5), (30, 9.5), (29, 10.5))
        make_face()
        with BuildLine():
            Line((29, 15.5), (17, 15.5))
            ThreePointArc((17, 15.5), (16, 14.5), (17, 13.5))
            Line((17, 13.5), (29, 13.5))
            ThreePointArc((29, 13.5), (30, 14.5), (29, 15.5))
        make_face()
    extrude(amount=-CUT_EXTRUDE_6_DEPTH, mode=Mode.SUBTRACT)

    # 草图10 → 切除-拉伸7 (cut)
    with BuildSketch(Plane(origin=(0, 0, 1), x_dir=(-1, 0, 0), z_dir=(0, 0, -1))):
        with Locations((-33.85, 34.5)):
            Rectangle(SKETCH_10_W, SKETCH_10_H)
        with Locations((33.85, 34.5)):
            Rectangle(SKETCH_10_W, SKETCH_10_H)
    extrude(amount=-CUT_EXTRUDE_7_DEPTH, mode=Mode.SUBTRACT)


solid = part.part
